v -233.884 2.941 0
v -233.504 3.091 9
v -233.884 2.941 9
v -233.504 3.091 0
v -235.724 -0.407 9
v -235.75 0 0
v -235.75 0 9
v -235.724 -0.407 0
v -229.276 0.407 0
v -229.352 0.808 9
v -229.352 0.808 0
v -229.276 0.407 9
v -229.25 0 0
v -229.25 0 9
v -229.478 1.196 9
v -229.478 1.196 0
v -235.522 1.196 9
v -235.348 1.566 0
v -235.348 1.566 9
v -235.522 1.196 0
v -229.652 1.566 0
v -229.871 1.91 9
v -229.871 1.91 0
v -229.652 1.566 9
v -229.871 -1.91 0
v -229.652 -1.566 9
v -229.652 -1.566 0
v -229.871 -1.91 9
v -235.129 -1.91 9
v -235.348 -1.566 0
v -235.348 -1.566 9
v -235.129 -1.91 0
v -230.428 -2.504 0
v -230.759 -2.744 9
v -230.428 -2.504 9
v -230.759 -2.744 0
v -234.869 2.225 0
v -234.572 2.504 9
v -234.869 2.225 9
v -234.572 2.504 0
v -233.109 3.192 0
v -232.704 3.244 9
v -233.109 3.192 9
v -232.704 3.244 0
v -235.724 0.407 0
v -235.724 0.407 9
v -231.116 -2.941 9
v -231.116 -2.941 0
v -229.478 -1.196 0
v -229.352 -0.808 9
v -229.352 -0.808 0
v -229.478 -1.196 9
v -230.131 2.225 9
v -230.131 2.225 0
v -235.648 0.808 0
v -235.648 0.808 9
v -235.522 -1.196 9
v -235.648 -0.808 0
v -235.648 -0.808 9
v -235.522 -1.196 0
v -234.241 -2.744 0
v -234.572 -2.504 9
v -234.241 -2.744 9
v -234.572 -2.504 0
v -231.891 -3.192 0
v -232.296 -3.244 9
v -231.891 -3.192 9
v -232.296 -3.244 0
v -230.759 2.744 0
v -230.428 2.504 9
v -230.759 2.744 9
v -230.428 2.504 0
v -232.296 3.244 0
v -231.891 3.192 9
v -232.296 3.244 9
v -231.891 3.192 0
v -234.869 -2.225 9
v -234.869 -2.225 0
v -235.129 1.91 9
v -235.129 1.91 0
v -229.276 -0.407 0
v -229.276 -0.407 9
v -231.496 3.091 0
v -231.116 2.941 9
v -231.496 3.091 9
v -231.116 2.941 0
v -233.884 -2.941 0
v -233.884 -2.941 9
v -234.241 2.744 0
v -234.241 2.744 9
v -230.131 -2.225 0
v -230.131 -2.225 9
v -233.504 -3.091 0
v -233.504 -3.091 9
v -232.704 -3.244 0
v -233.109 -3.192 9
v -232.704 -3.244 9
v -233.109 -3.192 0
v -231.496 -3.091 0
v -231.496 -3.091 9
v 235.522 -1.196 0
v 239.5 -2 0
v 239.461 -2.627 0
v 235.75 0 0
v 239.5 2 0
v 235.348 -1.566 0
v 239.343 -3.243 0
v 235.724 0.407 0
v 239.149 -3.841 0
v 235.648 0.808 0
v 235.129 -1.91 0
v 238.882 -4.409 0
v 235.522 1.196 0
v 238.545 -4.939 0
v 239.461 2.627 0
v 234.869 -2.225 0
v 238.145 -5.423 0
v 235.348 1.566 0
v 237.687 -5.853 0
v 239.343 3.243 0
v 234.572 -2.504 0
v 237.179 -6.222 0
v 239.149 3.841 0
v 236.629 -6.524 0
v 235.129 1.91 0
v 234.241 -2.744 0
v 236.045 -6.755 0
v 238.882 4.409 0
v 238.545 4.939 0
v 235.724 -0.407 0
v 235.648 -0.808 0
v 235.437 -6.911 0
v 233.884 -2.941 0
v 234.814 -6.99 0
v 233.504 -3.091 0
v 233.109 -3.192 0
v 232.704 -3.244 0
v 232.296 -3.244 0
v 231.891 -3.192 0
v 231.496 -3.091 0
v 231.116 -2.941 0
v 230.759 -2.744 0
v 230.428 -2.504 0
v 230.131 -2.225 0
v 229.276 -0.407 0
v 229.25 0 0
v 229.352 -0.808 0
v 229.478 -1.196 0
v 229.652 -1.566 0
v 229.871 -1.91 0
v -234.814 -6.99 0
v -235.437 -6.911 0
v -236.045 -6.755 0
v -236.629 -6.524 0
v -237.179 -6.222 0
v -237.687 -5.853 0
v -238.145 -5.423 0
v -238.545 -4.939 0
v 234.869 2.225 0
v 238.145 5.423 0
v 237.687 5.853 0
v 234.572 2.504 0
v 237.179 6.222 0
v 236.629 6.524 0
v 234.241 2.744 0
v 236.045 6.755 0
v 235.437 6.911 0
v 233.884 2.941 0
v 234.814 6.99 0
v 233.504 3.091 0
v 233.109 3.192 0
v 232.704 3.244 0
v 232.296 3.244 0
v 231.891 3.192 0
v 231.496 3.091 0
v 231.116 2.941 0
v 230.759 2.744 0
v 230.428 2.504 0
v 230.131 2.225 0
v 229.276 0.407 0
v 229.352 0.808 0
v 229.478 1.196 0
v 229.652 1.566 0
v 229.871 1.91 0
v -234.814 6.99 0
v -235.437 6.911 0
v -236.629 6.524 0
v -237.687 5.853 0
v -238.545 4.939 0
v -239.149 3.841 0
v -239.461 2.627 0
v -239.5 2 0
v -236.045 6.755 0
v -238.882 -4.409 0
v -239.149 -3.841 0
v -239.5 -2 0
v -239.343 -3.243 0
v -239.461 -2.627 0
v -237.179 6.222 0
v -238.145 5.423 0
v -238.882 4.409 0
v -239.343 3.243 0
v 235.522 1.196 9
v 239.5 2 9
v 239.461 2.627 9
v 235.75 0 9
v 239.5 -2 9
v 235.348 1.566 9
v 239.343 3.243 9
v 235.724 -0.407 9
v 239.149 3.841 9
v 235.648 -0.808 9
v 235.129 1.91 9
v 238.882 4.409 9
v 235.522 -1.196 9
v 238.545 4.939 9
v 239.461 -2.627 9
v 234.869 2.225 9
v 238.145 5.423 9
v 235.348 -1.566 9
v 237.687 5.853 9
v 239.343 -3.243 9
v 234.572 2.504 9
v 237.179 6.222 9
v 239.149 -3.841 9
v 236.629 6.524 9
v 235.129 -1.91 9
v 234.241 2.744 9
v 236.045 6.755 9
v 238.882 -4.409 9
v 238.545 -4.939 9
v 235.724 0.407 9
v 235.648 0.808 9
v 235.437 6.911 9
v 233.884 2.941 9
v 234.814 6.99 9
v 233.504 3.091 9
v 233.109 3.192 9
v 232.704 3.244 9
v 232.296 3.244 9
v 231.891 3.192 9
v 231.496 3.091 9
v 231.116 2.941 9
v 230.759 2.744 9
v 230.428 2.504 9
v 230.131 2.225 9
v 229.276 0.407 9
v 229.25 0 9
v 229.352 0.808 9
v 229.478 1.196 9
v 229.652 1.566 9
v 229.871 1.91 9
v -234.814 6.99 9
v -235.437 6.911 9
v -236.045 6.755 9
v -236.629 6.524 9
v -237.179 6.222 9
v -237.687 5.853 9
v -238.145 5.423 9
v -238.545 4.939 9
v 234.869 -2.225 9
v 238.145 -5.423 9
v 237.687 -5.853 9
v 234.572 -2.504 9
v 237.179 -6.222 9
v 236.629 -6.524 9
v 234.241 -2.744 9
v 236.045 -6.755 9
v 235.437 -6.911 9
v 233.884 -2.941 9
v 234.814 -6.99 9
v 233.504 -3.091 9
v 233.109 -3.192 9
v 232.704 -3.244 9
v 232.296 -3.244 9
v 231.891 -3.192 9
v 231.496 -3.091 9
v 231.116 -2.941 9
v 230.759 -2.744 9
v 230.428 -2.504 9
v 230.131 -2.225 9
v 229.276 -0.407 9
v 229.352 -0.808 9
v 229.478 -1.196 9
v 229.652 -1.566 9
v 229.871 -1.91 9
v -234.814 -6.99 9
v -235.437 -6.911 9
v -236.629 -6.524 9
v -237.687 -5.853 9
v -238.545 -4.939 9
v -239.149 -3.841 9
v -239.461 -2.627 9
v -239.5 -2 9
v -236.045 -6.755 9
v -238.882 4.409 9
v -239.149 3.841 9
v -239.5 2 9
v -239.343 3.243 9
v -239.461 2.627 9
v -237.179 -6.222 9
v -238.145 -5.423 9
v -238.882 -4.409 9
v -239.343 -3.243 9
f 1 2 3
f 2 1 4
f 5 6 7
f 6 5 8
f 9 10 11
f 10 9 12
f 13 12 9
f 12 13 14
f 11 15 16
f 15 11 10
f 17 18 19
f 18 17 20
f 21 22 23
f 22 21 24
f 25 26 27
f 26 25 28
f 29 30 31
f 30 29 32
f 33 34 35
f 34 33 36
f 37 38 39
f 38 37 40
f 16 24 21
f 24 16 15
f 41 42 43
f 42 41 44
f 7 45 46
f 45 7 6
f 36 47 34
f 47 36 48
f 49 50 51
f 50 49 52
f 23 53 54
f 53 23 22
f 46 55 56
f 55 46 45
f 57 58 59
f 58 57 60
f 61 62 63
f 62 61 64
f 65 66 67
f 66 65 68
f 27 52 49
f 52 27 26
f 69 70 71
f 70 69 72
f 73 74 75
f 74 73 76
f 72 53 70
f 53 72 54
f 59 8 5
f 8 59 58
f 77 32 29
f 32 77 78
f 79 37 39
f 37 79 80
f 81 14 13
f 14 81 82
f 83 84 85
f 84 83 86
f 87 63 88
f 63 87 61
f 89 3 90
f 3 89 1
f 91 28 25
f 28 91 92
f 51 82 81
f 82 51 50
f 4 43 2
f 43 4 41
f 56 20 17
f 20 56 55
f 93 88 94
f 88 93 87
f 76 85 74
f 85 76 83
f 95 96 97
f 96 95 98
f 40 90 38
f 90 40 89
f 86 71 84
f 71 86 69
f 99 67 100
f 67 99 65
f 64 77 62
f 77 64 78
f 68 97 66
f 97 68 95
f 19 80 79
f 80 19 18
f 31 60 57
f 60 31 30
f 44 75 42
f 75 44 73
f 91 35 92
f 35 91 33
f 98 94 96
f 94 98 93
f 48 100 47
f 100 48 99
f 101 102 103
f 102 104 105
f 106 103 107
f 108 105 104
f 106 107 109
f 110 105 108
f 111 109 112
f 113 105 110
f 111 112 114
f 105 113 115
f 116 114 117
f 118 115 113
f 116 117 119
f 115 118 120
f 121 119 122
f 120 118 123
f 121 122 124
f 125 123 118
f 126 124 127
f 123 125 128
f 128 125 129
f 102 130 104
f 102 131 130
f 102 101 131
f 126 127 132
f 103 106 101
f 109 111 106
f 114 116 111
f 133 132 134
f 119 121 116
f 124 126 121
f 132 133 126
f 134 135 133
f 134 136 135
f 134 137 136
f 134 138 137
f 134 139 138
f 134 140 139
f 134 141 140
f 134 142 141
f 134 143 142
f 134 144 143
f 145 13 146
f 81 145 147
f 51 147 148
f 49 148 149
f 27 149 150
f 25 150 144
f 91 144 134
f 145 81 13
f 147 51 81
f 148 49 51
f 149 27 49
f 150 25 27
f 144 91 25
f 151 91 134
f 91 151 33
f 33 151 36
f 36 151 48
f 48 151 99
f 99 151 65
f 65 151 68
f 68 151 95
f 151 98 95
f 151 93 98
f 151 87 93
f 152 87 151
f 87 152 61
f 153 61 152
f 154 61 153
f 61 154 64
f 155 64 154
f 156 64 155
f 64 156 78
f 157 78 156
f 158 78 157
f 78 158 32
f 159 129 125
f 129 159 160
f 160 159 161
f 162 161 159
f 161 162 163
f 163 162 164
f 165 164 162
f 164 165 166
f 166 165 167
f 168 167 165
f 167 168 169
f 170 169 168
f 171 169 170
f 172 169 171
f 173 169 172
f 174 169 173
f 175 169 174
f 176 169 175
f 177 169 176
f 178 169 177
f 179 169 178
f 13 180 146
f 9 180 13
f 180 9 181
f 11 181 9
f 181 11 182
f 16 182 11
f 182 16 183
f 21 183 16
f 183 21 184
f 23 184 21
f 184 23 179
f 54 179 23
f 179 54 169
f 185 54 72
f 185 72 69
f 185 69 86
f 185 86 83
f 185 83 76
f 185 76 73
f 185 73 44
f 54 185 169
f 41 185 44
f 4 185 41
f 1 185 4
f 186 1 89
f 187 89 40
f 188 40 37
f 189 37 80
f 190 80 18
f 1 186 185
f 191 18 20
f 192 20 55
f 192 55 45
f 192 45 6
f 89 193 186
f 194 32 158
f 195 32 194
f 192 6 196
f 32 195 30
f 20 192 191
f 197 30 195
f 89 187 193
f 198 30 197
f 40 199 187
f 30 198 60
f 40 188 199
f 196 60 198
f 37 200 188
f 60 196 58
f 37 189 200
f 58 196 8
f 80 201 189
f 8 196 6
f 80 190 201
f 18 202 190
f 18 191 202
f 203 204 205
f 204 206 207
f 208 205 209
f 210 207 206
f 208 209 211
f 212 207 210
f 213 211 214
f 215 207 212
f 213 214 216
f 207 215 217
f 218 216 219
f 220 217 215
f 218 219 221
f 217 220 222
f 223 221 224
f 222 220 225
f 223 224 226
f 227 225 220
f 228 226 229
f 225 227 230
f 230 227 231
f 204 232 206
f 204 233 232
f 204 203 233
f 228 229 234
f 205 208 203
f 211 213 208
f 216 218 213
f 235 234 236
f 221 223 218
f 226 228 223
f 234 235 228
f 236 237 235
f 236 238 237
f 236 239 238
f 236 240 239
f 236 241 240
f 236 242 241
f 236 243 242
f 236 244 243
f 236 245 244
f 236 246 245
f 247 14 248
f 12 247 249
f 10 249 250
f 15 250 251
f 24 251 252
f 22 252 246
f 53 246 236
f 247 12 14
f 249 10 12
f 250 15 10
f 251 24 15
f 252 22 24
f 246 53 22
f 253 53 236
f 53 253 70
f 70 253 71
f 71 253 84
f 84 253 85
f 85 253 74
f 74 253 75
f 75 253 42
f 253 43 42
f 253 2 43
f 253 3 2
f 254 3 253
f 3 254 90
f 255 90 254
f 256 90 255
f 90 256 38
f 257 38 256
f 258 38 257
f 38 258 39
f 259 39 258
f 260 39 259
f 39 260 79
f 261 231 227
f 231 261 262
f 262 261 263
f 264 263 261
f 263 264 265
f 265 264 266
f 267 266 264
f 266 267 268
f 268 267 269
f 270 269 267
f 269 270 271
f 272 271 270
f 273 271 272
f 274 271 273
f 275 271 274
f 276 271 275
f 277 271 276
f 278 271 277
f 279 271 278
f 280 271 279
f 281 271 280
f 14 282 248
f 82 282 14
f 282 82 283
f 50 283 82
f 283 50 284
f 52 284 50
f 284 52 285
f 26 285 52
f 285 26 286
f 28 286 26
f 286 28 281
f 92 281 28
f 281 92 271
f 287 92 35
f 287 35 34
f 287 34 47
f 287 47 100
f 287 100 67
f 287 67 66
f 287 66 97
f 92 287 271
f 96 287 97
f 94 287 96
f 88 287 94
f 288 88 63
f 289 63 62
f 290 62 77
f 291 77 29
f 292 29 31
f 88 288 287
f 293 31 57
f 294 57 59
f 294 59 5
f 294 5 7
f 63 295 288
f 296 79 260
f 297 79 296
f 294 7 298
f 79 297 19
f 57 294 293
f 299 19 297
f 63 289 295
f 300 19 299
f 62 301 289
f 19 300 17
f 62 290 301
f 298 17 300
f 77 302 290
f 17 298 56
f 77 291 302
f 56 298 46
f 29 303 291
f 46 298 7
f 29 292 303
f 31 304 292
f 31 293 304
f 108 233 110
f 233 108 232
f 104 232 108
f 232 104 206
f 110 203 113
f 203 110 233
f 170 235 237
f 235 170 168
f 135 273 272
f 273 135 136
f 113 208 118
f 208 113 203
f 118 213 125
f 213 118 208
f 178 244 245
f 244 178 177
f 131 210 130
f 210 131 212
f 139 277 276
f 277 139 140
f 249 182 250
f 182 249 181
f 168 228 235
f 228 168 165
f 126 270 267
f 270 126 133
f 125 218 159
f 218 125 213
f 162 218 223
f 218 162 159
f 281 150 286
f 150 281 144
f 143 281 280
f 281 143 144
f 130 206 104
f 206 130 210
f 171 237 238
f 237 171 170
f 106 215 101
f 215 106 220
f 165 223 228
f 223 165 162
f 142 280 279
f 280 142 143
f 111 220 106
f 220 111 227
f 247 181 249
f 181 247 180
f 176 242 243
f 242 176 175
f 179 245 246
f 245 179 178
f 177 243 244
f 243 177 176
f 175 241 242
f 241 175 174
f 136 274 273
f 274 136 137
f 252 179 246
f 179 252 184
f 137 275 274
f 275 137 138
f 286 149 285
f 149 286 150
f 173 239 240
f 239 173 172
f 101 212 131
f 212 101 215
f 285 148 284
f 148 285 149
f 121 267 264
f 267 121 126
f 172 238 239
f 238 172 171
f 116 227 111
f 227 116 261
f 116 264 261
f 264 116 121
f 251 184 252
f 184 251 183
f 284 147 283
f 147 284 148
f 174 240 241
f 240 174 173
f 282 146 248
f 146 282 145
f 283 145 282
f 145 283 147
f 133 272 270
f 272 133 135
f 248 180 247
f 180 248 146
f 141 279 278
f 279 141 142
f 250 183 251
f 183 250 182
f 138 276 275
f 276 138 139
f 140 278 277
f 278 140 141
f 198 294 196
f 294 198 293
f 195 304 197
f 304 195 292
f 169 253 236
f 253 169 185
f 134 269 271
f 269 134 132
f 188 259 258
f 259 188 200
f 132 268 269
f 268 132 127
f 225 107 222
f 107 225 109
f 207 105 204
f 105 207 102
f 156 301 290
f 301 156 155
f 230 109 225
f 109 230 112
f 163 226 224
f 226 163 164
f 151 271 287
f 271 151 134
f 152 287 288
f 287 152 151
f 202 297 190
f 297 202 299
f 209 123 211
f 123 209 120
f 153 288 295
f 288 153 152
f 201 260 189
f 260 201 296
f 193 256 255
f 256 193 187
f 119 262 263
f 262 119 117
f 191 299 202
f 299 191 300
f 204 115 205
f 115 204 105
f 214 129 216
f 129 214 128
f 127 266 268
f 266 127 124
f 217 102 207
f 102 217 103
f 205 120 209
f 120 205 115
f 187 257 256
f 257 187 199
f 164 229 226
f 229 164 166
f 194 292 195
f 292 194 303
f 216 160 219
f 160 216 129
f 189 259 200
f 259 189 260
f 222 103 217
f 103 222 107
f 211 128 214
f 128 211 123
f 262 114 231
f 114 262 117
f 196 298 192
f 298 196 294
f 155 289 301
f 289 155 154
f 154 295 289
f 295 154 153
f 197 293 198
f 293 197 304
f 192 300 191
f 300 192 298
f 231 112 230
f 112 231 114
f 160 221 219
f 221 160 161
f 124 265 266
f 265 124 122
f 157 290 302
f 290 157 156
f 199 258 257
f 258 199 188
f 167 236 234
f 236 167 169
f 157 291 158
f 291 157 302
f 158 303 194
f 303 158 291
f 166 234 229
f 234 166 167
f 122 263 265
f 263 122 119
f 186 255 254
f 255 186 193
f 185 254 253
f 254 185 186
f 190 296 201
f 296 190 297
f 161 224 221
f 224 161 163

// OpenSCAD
$fn = 50;


difference() {
	union() {
		hull() {
			translate(v = [-234.5000000000, 2.0000000000, 0]) {
				cylinder(h = 9, r = 5);
			}
			translate(v = [234.5000000000, 2.0000000000, 0]) {
				cylinder(h = 9, r = 5);
			}
			translate(v = [-234.5000000000, -2.0000000000, 0]) {
				cylinder(h = 9, r = 5);
			}
			translate(v = [234.5000000000, -2.0000000000, 0]) {
				cylinder(h = 9, r = 5);
			}
		}
	}
	union() {
		translate(v = [-232.5000000000, 0.0000000000, 0]) {
			cylinder(h = 9, r = 3.2500000000);
		}
		translate(v = [232.5000000000, 0.0000000000, 0]) {
			cylinder(h = 9, r = 3.2500000000);
		}
		translate(v = [-232.5000000000, 0.0000000000, 0]) {
			cylinder(h = 9, r = 1.8000000000);
		}
		translate(v = [232.5000000000, 0.0000000000, 0]) {
			cylinder(h = 9, r = 1.8000000000);
		}
		translate(v = [-232.5000000000, 0.0000000000, 0]) {
			cylinder(h = 9, r = 1.8000000000);
		}
		translate(v = [232.5000000000, 0.0000000000, 0]) {
			cylinder(h = 9, r = 1.8000000000);
		}
		translate(v = [-232.5000000000, 0.0000000000, 0]) {
			cylinder(h = 9, r = 1.8000000000);
		}
		translate(v = [232.5000000000, 0.0000000000, 0]) {
			cylinder(h = 9, r = 1.8000000000);
		}
	}
}
